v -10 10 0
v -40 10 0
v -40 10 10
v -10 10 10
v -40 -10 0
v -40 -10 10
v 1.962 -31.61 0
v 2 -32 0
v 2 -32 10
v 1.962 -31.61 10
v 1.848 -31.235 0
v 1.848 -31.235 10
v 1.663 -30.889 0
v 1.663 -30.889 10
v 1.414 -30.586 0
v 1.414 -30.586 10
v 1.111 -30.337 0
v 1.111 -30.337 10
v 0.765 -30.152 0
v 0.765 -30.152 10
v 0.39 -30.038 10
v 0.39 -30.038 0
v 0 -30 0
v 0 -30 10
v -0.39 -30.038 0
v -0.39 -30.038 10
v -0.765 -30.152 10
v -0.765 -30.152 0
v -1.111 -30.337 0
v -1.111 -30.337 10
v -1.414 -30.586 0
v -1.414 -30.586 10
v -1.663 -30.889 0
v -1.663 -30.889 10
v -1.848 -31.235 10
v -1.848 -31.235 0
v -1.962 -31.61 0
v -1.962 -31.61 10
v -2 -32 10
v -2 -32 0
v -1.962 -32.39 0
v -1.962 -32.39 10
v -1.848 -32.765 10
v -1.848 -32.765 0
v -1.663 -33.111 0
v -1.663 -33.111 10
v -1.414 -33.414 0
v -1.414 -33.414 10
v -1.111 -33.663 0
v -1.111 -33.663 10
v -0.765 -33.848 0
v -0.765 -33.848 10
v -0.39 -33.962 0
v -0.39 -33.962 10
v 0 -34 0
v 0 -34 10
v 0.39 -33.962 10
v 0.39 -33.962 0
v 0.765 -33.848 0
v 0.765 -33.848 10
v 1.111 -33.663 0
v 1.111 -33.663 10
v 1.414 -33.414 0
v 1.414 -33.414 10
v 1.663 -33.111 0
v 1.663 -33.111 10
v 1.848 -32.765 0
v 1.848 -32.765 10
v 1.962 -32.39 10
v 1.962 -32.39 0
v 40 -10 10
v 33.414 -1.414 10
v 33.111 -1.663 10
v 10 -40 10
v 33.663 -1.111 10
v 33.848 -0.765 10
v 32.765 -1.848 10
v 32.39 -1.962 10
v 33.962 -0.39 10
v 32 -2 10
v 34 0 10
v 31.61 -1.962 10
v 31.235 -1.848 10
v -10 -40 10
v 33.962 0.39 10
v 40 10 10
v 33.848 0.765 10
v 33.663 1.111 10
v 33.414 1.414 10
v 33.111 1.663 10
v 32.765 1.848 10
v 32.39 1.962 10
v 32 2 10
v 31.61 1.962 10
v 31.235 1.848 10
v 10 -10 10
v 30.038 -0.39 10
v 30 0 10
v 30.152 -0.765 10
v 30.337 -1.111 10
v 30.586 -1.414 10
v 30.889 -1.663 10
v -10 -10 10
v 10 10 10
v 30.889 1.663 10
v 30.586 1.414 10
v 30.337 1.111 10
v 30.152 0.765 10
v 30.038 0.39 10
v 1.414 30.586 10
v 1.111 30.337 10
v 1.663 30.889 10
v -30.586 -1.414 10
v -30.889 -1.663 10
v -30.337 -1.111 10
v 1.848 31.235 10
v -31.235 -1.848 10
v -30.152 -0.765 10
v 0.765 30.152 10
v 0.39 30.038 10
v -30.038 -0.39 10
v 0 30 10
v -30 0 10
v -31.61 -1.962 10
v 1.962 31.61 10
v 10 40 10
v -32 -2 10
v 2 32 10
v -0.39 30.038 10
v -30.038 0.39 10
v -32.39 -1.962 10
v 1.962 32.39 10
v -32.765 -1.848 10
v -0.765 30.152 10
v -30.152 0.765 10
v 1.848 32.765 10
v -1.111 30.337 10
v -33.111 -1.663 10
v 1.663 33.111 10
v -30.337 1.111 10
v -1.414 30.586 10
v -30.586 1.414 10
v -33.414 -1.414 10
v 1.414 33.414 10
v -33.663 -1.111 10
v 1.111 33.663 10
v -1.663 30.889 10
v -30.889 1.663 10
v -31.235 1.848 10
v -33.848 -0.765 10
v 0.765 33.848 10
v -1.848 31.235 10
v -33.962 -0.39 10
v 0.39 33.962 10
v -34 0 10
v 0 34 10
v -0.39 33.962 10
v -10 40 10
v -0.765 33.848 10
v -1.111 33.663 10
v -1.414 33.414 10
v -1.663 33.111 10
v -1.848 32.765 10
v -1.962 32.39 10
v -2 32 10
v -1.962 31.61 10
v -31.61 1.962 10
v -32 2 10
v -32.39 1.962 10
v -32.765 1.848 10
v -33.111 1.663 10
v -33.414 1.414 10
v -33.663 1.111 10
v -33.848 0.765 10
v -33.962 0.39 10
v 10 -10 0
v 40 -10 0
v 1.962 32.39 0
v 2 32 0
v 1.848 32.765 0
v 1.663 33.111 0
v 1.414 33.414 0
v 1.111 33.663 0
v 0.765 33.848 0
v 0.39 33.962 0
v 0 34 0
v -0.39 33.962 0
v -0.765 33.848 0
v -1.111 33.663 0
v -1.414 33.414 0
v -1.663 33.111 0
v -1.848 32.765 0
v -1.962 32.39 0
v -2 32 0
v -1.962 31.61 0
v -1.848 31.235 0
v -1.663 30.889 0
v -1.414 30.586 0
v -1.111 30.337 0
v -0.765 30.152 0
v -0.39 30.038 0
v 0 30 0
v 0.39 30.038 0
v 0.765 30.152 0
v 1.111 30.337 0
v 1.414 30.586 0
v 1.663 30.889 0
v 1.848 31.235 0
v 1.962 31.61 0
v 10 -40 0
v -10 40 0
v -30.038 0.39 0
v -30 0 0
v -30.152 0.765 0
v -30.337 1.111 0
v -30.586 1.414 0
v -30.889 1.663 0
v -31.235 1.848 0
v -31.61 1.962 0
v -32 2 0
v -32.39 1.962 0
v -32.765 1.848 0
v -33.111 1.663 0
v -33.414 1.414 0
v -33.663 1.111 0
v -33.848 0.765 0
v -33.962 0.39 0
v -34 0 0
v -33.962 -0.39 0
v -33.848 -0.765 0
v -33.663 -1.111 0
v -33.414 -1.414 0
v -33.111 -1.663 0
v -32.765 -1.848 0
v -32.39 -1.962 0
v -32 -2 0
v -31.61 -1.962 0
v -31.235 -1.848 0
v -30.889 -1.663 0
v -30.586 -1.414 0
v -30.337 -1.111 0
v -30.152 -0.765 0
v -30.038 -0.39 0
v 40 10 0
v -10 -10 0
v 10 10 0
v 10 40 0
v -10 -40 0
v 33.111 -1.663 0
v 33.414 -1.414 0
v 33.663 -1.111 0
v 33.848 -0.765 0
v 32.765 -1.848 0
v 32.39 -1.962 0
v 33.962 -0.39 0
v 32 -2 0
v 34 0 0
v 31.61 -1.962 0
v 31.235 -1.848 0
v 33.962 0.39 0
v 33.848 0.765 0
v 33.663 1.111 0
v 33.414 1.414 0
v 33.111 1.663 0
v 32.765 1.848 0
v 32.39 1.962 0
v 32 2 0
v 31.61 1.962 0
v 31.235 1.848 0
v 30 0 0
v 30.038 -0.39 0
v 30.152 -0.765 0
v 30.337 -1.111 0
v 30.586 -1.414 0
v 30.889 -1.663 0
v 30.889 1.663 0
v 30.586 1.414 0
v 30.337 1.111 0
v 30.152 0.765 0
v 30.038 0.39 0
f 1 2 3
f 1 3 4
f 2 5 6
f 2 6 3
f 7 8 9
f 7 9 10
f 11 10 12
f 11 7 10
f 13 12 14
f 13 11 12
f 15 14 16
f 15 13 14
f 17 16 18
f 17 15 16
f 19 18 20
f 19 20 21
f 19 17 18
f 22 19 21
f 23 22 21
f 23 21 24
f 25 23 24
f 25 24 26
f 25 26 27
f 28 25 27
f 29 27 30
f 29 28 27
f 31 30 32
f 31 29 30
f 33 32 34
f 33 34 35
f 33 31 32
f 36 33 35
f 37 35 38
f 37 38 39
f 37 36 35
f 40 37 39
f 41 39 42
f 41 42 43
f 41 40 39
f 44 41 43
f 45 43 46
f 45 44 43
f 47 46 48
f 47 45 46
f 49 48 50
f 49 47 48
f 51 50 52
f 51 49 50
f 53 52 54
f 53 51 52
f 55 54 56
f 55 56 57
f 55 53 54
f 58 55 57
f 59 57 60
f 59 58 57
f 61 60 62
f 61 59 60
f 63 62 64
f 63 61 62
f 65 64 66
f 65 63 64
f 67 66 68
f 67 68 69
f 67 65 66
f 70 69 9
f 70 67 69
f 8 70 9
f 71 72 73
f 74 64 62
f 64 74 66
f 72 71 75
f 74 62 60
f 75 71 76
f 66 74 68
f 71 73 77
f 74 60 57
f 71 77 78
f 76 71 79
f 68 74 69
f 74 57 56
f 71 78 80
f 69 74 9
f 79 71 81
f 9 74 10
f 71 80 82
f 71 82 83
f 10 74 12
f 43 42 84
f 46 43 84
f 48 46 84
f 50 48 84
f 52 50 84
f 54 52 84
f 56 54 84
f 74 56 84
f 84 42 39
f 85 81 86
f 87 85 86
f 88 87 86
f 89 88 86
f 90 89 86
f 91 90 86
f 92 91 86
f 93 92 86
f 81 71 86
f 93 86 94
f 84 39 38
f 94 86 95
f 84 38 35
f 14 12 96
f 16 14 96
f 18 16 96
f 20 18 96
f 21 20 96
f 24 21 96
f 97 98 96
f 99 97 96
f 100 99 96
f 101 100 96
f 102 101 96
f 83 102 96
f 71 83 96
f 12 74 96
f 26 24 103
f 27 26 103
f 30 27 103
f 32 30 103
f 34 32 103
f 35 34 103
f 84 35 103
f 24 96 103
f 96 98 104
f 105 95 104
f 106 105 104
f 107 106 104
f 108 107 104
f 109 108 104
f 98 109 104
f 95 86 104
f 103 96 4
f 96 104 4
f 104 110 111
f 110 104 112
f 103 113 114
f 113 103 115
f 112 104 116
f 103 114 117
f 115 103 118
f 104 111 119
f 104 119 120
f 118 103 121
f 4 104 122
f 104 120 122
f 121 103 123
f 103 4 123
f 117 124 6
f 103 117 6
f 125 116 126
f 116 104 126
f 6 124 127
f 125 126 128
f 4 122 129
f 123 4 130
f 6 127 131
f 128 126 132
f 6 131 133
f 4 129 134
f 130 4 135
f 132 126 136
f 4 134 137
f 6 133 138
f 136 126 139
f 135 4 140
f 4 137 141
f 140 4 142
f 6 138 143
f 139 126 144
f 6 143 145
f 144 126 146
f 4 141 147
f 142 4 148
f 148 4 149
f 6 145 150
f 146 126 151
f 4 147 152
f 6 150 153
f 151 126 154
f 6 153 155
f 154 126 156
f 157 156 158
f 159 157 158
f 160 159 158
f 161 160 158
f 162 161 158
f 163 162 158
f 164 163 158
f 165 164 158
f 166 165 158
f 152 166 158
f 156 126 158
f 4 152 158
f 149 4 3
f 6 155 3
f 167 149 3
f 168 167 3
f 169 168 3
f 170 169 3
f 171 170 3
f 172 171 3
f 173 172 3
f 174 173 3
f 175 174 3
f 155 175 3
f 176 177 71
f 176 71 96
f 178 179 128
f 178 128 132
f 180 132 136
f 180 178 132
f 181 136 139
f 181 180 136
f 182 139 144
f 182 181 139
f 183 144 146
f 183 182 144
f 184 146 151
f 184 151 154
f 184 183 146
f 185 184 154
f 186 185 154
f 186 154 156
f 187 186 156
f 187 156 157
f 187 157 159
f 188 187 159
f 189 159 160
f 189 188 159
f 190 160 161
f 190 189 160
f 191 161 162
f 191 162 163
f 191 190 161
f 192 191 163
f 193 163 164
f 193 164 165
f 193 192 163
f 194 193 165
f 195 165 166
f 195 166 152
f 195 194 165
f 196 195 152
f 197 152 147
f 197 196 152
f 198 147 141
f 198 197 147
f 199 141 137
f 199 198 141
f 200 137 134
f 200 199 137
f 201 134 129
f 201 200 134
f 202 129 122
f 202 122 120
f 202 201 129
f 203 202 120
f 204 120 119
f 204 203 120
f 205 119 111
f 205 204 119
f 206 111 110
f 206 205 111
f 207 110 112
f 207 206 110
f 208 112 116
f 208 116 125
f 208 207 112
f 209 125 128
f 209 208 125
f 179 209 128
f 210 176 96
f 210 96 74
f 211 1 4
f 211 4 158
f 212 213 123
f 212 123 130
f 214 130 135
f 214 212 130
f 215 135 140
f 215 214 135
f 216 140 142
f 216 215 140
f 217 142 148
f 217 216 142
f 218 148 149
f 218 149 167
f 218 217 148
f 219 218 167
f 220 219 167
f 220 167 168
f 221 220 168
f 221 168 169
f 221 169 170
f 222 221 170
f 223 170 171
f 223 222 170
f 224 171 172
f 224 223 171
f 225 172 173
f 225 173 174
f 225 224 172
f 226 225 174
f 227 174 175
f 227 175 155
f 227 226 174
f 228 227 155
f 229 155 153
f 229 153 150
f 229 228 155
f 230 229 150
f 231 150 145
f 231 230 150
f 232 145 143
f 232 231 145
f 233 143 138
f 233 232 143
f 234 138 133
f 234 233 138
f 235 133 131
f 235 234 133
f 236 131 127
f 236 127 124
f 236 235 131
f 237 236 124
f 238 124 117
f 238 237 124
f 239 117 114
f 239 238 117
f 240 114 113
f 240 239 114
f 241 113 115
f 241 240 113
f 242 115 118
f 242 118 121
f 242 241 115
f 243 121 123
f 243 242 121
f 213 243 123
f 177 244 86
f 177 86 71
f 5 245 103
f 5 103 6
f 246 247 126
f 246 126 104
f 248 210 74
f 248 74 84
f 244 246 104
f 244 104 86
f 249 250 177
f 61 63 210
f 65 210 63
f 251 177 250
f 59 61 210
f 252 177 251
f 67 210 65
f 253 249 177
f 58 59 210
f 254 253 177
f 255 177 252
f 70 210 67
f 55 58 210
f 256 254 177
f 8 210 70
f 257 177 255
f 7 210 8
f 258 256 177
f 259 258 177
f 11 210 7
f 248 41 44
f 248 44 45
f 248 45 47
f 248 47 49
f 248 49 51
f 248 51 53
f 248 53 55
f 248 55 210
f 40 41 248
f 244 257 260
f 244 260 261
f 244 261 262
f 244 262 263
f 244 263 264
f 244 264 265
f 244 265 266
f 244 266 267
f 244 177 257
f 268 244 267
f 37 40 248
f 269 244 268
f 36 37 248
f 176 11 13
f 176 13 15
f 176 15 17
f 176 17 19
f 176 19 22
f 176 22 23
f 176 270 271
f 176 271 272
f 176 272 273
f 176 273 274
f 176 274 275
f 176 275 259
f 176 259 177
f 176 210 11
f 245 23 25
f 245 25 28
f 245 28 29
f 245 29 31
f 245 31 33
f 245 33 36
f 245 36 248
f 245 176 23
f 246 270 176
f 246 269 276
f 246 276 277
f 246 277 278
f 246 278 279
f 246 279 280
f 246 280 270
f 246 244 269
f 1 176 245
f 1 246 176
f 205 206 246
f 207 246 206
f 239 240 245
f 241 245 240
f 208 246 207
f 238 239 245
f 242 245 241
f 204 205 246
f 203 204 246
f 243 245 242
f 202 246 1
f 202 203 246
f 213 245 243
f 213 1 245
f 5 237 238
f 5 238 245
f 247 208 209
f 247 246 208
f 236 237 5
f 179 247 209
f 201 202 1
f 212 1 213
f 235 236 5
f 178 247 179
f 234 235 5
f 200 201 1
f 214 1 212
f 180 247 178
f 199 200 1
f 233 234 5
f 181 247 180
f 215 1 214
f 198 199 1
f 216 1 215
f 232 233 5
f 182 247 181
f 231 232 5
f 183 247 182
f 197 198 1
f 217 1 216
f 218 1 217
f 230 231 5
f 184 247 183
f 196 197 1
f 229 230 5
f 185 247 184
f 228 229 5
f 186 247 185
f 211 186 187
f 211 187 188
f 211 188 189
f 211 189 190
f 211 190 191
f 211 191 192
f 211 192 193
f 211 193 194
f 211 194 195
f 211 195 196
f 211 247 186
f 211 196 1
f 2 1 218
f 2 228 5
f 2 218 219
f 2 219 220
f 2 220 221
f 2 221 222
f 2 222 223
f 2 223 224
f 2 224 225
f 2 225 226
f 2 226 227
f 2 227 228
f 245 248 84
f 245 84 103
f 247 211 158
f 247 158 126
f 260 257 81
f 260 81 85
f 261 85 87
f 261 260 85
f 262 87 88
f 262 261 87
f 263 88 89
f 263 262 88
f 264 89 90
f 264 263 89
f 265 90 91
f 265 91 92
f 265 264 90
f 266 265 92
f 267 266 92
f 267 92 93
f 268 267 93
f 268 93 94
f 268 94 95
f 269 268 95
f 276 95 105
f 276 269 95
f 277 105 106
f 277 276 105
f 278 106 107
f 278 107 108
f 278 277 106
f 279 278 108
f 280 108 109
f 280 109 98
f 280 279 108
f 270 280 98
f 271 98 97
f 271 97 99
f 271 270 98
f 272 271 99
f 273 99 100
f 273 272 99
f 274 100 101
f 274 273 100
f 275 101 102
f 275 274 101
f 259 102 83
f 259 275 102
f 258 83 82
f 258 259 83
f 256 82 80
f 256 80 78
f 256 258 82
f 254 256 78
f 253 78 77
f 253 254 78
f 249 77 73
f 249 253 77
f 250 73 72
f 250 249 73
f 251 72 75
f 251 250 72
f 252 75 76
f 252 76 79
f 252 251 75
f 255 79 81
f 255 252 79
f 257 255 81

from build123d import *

# Parameters (mm, degrees)
SKETCH_R  = 2
PAD_DEPTH = 10


with BuildPart() as part:
    # Sketch → Pad (new body)
    with BuildSketch(Plane.XY):
        Polygon((-10, 40), (10, 40), (10, 10), (40, 10), (40, -10), (10, -10), (10, -40), (-10, -40), (-10, -10), (-40, -10), (-40, 10), (-10, 10), align=None)
        with Locations((0, 32)):
            Circle(SKETCH_R, mode=Mode.SUBTRACT)
        with Locations((32, 0)):
            Circle(SKETCH_R, mode=Mode.SUBTRACT)
        with Locations((0, -32)):
            Circle(SKETCH_R, mode=Mode.SUBTRACT)
        with Locations((-32, 0)):
            Circle(SKETCH_R, mode=Mode.SUBTRACT)
    extrude(amount=PAD_DEPTH)


solid = part.part
